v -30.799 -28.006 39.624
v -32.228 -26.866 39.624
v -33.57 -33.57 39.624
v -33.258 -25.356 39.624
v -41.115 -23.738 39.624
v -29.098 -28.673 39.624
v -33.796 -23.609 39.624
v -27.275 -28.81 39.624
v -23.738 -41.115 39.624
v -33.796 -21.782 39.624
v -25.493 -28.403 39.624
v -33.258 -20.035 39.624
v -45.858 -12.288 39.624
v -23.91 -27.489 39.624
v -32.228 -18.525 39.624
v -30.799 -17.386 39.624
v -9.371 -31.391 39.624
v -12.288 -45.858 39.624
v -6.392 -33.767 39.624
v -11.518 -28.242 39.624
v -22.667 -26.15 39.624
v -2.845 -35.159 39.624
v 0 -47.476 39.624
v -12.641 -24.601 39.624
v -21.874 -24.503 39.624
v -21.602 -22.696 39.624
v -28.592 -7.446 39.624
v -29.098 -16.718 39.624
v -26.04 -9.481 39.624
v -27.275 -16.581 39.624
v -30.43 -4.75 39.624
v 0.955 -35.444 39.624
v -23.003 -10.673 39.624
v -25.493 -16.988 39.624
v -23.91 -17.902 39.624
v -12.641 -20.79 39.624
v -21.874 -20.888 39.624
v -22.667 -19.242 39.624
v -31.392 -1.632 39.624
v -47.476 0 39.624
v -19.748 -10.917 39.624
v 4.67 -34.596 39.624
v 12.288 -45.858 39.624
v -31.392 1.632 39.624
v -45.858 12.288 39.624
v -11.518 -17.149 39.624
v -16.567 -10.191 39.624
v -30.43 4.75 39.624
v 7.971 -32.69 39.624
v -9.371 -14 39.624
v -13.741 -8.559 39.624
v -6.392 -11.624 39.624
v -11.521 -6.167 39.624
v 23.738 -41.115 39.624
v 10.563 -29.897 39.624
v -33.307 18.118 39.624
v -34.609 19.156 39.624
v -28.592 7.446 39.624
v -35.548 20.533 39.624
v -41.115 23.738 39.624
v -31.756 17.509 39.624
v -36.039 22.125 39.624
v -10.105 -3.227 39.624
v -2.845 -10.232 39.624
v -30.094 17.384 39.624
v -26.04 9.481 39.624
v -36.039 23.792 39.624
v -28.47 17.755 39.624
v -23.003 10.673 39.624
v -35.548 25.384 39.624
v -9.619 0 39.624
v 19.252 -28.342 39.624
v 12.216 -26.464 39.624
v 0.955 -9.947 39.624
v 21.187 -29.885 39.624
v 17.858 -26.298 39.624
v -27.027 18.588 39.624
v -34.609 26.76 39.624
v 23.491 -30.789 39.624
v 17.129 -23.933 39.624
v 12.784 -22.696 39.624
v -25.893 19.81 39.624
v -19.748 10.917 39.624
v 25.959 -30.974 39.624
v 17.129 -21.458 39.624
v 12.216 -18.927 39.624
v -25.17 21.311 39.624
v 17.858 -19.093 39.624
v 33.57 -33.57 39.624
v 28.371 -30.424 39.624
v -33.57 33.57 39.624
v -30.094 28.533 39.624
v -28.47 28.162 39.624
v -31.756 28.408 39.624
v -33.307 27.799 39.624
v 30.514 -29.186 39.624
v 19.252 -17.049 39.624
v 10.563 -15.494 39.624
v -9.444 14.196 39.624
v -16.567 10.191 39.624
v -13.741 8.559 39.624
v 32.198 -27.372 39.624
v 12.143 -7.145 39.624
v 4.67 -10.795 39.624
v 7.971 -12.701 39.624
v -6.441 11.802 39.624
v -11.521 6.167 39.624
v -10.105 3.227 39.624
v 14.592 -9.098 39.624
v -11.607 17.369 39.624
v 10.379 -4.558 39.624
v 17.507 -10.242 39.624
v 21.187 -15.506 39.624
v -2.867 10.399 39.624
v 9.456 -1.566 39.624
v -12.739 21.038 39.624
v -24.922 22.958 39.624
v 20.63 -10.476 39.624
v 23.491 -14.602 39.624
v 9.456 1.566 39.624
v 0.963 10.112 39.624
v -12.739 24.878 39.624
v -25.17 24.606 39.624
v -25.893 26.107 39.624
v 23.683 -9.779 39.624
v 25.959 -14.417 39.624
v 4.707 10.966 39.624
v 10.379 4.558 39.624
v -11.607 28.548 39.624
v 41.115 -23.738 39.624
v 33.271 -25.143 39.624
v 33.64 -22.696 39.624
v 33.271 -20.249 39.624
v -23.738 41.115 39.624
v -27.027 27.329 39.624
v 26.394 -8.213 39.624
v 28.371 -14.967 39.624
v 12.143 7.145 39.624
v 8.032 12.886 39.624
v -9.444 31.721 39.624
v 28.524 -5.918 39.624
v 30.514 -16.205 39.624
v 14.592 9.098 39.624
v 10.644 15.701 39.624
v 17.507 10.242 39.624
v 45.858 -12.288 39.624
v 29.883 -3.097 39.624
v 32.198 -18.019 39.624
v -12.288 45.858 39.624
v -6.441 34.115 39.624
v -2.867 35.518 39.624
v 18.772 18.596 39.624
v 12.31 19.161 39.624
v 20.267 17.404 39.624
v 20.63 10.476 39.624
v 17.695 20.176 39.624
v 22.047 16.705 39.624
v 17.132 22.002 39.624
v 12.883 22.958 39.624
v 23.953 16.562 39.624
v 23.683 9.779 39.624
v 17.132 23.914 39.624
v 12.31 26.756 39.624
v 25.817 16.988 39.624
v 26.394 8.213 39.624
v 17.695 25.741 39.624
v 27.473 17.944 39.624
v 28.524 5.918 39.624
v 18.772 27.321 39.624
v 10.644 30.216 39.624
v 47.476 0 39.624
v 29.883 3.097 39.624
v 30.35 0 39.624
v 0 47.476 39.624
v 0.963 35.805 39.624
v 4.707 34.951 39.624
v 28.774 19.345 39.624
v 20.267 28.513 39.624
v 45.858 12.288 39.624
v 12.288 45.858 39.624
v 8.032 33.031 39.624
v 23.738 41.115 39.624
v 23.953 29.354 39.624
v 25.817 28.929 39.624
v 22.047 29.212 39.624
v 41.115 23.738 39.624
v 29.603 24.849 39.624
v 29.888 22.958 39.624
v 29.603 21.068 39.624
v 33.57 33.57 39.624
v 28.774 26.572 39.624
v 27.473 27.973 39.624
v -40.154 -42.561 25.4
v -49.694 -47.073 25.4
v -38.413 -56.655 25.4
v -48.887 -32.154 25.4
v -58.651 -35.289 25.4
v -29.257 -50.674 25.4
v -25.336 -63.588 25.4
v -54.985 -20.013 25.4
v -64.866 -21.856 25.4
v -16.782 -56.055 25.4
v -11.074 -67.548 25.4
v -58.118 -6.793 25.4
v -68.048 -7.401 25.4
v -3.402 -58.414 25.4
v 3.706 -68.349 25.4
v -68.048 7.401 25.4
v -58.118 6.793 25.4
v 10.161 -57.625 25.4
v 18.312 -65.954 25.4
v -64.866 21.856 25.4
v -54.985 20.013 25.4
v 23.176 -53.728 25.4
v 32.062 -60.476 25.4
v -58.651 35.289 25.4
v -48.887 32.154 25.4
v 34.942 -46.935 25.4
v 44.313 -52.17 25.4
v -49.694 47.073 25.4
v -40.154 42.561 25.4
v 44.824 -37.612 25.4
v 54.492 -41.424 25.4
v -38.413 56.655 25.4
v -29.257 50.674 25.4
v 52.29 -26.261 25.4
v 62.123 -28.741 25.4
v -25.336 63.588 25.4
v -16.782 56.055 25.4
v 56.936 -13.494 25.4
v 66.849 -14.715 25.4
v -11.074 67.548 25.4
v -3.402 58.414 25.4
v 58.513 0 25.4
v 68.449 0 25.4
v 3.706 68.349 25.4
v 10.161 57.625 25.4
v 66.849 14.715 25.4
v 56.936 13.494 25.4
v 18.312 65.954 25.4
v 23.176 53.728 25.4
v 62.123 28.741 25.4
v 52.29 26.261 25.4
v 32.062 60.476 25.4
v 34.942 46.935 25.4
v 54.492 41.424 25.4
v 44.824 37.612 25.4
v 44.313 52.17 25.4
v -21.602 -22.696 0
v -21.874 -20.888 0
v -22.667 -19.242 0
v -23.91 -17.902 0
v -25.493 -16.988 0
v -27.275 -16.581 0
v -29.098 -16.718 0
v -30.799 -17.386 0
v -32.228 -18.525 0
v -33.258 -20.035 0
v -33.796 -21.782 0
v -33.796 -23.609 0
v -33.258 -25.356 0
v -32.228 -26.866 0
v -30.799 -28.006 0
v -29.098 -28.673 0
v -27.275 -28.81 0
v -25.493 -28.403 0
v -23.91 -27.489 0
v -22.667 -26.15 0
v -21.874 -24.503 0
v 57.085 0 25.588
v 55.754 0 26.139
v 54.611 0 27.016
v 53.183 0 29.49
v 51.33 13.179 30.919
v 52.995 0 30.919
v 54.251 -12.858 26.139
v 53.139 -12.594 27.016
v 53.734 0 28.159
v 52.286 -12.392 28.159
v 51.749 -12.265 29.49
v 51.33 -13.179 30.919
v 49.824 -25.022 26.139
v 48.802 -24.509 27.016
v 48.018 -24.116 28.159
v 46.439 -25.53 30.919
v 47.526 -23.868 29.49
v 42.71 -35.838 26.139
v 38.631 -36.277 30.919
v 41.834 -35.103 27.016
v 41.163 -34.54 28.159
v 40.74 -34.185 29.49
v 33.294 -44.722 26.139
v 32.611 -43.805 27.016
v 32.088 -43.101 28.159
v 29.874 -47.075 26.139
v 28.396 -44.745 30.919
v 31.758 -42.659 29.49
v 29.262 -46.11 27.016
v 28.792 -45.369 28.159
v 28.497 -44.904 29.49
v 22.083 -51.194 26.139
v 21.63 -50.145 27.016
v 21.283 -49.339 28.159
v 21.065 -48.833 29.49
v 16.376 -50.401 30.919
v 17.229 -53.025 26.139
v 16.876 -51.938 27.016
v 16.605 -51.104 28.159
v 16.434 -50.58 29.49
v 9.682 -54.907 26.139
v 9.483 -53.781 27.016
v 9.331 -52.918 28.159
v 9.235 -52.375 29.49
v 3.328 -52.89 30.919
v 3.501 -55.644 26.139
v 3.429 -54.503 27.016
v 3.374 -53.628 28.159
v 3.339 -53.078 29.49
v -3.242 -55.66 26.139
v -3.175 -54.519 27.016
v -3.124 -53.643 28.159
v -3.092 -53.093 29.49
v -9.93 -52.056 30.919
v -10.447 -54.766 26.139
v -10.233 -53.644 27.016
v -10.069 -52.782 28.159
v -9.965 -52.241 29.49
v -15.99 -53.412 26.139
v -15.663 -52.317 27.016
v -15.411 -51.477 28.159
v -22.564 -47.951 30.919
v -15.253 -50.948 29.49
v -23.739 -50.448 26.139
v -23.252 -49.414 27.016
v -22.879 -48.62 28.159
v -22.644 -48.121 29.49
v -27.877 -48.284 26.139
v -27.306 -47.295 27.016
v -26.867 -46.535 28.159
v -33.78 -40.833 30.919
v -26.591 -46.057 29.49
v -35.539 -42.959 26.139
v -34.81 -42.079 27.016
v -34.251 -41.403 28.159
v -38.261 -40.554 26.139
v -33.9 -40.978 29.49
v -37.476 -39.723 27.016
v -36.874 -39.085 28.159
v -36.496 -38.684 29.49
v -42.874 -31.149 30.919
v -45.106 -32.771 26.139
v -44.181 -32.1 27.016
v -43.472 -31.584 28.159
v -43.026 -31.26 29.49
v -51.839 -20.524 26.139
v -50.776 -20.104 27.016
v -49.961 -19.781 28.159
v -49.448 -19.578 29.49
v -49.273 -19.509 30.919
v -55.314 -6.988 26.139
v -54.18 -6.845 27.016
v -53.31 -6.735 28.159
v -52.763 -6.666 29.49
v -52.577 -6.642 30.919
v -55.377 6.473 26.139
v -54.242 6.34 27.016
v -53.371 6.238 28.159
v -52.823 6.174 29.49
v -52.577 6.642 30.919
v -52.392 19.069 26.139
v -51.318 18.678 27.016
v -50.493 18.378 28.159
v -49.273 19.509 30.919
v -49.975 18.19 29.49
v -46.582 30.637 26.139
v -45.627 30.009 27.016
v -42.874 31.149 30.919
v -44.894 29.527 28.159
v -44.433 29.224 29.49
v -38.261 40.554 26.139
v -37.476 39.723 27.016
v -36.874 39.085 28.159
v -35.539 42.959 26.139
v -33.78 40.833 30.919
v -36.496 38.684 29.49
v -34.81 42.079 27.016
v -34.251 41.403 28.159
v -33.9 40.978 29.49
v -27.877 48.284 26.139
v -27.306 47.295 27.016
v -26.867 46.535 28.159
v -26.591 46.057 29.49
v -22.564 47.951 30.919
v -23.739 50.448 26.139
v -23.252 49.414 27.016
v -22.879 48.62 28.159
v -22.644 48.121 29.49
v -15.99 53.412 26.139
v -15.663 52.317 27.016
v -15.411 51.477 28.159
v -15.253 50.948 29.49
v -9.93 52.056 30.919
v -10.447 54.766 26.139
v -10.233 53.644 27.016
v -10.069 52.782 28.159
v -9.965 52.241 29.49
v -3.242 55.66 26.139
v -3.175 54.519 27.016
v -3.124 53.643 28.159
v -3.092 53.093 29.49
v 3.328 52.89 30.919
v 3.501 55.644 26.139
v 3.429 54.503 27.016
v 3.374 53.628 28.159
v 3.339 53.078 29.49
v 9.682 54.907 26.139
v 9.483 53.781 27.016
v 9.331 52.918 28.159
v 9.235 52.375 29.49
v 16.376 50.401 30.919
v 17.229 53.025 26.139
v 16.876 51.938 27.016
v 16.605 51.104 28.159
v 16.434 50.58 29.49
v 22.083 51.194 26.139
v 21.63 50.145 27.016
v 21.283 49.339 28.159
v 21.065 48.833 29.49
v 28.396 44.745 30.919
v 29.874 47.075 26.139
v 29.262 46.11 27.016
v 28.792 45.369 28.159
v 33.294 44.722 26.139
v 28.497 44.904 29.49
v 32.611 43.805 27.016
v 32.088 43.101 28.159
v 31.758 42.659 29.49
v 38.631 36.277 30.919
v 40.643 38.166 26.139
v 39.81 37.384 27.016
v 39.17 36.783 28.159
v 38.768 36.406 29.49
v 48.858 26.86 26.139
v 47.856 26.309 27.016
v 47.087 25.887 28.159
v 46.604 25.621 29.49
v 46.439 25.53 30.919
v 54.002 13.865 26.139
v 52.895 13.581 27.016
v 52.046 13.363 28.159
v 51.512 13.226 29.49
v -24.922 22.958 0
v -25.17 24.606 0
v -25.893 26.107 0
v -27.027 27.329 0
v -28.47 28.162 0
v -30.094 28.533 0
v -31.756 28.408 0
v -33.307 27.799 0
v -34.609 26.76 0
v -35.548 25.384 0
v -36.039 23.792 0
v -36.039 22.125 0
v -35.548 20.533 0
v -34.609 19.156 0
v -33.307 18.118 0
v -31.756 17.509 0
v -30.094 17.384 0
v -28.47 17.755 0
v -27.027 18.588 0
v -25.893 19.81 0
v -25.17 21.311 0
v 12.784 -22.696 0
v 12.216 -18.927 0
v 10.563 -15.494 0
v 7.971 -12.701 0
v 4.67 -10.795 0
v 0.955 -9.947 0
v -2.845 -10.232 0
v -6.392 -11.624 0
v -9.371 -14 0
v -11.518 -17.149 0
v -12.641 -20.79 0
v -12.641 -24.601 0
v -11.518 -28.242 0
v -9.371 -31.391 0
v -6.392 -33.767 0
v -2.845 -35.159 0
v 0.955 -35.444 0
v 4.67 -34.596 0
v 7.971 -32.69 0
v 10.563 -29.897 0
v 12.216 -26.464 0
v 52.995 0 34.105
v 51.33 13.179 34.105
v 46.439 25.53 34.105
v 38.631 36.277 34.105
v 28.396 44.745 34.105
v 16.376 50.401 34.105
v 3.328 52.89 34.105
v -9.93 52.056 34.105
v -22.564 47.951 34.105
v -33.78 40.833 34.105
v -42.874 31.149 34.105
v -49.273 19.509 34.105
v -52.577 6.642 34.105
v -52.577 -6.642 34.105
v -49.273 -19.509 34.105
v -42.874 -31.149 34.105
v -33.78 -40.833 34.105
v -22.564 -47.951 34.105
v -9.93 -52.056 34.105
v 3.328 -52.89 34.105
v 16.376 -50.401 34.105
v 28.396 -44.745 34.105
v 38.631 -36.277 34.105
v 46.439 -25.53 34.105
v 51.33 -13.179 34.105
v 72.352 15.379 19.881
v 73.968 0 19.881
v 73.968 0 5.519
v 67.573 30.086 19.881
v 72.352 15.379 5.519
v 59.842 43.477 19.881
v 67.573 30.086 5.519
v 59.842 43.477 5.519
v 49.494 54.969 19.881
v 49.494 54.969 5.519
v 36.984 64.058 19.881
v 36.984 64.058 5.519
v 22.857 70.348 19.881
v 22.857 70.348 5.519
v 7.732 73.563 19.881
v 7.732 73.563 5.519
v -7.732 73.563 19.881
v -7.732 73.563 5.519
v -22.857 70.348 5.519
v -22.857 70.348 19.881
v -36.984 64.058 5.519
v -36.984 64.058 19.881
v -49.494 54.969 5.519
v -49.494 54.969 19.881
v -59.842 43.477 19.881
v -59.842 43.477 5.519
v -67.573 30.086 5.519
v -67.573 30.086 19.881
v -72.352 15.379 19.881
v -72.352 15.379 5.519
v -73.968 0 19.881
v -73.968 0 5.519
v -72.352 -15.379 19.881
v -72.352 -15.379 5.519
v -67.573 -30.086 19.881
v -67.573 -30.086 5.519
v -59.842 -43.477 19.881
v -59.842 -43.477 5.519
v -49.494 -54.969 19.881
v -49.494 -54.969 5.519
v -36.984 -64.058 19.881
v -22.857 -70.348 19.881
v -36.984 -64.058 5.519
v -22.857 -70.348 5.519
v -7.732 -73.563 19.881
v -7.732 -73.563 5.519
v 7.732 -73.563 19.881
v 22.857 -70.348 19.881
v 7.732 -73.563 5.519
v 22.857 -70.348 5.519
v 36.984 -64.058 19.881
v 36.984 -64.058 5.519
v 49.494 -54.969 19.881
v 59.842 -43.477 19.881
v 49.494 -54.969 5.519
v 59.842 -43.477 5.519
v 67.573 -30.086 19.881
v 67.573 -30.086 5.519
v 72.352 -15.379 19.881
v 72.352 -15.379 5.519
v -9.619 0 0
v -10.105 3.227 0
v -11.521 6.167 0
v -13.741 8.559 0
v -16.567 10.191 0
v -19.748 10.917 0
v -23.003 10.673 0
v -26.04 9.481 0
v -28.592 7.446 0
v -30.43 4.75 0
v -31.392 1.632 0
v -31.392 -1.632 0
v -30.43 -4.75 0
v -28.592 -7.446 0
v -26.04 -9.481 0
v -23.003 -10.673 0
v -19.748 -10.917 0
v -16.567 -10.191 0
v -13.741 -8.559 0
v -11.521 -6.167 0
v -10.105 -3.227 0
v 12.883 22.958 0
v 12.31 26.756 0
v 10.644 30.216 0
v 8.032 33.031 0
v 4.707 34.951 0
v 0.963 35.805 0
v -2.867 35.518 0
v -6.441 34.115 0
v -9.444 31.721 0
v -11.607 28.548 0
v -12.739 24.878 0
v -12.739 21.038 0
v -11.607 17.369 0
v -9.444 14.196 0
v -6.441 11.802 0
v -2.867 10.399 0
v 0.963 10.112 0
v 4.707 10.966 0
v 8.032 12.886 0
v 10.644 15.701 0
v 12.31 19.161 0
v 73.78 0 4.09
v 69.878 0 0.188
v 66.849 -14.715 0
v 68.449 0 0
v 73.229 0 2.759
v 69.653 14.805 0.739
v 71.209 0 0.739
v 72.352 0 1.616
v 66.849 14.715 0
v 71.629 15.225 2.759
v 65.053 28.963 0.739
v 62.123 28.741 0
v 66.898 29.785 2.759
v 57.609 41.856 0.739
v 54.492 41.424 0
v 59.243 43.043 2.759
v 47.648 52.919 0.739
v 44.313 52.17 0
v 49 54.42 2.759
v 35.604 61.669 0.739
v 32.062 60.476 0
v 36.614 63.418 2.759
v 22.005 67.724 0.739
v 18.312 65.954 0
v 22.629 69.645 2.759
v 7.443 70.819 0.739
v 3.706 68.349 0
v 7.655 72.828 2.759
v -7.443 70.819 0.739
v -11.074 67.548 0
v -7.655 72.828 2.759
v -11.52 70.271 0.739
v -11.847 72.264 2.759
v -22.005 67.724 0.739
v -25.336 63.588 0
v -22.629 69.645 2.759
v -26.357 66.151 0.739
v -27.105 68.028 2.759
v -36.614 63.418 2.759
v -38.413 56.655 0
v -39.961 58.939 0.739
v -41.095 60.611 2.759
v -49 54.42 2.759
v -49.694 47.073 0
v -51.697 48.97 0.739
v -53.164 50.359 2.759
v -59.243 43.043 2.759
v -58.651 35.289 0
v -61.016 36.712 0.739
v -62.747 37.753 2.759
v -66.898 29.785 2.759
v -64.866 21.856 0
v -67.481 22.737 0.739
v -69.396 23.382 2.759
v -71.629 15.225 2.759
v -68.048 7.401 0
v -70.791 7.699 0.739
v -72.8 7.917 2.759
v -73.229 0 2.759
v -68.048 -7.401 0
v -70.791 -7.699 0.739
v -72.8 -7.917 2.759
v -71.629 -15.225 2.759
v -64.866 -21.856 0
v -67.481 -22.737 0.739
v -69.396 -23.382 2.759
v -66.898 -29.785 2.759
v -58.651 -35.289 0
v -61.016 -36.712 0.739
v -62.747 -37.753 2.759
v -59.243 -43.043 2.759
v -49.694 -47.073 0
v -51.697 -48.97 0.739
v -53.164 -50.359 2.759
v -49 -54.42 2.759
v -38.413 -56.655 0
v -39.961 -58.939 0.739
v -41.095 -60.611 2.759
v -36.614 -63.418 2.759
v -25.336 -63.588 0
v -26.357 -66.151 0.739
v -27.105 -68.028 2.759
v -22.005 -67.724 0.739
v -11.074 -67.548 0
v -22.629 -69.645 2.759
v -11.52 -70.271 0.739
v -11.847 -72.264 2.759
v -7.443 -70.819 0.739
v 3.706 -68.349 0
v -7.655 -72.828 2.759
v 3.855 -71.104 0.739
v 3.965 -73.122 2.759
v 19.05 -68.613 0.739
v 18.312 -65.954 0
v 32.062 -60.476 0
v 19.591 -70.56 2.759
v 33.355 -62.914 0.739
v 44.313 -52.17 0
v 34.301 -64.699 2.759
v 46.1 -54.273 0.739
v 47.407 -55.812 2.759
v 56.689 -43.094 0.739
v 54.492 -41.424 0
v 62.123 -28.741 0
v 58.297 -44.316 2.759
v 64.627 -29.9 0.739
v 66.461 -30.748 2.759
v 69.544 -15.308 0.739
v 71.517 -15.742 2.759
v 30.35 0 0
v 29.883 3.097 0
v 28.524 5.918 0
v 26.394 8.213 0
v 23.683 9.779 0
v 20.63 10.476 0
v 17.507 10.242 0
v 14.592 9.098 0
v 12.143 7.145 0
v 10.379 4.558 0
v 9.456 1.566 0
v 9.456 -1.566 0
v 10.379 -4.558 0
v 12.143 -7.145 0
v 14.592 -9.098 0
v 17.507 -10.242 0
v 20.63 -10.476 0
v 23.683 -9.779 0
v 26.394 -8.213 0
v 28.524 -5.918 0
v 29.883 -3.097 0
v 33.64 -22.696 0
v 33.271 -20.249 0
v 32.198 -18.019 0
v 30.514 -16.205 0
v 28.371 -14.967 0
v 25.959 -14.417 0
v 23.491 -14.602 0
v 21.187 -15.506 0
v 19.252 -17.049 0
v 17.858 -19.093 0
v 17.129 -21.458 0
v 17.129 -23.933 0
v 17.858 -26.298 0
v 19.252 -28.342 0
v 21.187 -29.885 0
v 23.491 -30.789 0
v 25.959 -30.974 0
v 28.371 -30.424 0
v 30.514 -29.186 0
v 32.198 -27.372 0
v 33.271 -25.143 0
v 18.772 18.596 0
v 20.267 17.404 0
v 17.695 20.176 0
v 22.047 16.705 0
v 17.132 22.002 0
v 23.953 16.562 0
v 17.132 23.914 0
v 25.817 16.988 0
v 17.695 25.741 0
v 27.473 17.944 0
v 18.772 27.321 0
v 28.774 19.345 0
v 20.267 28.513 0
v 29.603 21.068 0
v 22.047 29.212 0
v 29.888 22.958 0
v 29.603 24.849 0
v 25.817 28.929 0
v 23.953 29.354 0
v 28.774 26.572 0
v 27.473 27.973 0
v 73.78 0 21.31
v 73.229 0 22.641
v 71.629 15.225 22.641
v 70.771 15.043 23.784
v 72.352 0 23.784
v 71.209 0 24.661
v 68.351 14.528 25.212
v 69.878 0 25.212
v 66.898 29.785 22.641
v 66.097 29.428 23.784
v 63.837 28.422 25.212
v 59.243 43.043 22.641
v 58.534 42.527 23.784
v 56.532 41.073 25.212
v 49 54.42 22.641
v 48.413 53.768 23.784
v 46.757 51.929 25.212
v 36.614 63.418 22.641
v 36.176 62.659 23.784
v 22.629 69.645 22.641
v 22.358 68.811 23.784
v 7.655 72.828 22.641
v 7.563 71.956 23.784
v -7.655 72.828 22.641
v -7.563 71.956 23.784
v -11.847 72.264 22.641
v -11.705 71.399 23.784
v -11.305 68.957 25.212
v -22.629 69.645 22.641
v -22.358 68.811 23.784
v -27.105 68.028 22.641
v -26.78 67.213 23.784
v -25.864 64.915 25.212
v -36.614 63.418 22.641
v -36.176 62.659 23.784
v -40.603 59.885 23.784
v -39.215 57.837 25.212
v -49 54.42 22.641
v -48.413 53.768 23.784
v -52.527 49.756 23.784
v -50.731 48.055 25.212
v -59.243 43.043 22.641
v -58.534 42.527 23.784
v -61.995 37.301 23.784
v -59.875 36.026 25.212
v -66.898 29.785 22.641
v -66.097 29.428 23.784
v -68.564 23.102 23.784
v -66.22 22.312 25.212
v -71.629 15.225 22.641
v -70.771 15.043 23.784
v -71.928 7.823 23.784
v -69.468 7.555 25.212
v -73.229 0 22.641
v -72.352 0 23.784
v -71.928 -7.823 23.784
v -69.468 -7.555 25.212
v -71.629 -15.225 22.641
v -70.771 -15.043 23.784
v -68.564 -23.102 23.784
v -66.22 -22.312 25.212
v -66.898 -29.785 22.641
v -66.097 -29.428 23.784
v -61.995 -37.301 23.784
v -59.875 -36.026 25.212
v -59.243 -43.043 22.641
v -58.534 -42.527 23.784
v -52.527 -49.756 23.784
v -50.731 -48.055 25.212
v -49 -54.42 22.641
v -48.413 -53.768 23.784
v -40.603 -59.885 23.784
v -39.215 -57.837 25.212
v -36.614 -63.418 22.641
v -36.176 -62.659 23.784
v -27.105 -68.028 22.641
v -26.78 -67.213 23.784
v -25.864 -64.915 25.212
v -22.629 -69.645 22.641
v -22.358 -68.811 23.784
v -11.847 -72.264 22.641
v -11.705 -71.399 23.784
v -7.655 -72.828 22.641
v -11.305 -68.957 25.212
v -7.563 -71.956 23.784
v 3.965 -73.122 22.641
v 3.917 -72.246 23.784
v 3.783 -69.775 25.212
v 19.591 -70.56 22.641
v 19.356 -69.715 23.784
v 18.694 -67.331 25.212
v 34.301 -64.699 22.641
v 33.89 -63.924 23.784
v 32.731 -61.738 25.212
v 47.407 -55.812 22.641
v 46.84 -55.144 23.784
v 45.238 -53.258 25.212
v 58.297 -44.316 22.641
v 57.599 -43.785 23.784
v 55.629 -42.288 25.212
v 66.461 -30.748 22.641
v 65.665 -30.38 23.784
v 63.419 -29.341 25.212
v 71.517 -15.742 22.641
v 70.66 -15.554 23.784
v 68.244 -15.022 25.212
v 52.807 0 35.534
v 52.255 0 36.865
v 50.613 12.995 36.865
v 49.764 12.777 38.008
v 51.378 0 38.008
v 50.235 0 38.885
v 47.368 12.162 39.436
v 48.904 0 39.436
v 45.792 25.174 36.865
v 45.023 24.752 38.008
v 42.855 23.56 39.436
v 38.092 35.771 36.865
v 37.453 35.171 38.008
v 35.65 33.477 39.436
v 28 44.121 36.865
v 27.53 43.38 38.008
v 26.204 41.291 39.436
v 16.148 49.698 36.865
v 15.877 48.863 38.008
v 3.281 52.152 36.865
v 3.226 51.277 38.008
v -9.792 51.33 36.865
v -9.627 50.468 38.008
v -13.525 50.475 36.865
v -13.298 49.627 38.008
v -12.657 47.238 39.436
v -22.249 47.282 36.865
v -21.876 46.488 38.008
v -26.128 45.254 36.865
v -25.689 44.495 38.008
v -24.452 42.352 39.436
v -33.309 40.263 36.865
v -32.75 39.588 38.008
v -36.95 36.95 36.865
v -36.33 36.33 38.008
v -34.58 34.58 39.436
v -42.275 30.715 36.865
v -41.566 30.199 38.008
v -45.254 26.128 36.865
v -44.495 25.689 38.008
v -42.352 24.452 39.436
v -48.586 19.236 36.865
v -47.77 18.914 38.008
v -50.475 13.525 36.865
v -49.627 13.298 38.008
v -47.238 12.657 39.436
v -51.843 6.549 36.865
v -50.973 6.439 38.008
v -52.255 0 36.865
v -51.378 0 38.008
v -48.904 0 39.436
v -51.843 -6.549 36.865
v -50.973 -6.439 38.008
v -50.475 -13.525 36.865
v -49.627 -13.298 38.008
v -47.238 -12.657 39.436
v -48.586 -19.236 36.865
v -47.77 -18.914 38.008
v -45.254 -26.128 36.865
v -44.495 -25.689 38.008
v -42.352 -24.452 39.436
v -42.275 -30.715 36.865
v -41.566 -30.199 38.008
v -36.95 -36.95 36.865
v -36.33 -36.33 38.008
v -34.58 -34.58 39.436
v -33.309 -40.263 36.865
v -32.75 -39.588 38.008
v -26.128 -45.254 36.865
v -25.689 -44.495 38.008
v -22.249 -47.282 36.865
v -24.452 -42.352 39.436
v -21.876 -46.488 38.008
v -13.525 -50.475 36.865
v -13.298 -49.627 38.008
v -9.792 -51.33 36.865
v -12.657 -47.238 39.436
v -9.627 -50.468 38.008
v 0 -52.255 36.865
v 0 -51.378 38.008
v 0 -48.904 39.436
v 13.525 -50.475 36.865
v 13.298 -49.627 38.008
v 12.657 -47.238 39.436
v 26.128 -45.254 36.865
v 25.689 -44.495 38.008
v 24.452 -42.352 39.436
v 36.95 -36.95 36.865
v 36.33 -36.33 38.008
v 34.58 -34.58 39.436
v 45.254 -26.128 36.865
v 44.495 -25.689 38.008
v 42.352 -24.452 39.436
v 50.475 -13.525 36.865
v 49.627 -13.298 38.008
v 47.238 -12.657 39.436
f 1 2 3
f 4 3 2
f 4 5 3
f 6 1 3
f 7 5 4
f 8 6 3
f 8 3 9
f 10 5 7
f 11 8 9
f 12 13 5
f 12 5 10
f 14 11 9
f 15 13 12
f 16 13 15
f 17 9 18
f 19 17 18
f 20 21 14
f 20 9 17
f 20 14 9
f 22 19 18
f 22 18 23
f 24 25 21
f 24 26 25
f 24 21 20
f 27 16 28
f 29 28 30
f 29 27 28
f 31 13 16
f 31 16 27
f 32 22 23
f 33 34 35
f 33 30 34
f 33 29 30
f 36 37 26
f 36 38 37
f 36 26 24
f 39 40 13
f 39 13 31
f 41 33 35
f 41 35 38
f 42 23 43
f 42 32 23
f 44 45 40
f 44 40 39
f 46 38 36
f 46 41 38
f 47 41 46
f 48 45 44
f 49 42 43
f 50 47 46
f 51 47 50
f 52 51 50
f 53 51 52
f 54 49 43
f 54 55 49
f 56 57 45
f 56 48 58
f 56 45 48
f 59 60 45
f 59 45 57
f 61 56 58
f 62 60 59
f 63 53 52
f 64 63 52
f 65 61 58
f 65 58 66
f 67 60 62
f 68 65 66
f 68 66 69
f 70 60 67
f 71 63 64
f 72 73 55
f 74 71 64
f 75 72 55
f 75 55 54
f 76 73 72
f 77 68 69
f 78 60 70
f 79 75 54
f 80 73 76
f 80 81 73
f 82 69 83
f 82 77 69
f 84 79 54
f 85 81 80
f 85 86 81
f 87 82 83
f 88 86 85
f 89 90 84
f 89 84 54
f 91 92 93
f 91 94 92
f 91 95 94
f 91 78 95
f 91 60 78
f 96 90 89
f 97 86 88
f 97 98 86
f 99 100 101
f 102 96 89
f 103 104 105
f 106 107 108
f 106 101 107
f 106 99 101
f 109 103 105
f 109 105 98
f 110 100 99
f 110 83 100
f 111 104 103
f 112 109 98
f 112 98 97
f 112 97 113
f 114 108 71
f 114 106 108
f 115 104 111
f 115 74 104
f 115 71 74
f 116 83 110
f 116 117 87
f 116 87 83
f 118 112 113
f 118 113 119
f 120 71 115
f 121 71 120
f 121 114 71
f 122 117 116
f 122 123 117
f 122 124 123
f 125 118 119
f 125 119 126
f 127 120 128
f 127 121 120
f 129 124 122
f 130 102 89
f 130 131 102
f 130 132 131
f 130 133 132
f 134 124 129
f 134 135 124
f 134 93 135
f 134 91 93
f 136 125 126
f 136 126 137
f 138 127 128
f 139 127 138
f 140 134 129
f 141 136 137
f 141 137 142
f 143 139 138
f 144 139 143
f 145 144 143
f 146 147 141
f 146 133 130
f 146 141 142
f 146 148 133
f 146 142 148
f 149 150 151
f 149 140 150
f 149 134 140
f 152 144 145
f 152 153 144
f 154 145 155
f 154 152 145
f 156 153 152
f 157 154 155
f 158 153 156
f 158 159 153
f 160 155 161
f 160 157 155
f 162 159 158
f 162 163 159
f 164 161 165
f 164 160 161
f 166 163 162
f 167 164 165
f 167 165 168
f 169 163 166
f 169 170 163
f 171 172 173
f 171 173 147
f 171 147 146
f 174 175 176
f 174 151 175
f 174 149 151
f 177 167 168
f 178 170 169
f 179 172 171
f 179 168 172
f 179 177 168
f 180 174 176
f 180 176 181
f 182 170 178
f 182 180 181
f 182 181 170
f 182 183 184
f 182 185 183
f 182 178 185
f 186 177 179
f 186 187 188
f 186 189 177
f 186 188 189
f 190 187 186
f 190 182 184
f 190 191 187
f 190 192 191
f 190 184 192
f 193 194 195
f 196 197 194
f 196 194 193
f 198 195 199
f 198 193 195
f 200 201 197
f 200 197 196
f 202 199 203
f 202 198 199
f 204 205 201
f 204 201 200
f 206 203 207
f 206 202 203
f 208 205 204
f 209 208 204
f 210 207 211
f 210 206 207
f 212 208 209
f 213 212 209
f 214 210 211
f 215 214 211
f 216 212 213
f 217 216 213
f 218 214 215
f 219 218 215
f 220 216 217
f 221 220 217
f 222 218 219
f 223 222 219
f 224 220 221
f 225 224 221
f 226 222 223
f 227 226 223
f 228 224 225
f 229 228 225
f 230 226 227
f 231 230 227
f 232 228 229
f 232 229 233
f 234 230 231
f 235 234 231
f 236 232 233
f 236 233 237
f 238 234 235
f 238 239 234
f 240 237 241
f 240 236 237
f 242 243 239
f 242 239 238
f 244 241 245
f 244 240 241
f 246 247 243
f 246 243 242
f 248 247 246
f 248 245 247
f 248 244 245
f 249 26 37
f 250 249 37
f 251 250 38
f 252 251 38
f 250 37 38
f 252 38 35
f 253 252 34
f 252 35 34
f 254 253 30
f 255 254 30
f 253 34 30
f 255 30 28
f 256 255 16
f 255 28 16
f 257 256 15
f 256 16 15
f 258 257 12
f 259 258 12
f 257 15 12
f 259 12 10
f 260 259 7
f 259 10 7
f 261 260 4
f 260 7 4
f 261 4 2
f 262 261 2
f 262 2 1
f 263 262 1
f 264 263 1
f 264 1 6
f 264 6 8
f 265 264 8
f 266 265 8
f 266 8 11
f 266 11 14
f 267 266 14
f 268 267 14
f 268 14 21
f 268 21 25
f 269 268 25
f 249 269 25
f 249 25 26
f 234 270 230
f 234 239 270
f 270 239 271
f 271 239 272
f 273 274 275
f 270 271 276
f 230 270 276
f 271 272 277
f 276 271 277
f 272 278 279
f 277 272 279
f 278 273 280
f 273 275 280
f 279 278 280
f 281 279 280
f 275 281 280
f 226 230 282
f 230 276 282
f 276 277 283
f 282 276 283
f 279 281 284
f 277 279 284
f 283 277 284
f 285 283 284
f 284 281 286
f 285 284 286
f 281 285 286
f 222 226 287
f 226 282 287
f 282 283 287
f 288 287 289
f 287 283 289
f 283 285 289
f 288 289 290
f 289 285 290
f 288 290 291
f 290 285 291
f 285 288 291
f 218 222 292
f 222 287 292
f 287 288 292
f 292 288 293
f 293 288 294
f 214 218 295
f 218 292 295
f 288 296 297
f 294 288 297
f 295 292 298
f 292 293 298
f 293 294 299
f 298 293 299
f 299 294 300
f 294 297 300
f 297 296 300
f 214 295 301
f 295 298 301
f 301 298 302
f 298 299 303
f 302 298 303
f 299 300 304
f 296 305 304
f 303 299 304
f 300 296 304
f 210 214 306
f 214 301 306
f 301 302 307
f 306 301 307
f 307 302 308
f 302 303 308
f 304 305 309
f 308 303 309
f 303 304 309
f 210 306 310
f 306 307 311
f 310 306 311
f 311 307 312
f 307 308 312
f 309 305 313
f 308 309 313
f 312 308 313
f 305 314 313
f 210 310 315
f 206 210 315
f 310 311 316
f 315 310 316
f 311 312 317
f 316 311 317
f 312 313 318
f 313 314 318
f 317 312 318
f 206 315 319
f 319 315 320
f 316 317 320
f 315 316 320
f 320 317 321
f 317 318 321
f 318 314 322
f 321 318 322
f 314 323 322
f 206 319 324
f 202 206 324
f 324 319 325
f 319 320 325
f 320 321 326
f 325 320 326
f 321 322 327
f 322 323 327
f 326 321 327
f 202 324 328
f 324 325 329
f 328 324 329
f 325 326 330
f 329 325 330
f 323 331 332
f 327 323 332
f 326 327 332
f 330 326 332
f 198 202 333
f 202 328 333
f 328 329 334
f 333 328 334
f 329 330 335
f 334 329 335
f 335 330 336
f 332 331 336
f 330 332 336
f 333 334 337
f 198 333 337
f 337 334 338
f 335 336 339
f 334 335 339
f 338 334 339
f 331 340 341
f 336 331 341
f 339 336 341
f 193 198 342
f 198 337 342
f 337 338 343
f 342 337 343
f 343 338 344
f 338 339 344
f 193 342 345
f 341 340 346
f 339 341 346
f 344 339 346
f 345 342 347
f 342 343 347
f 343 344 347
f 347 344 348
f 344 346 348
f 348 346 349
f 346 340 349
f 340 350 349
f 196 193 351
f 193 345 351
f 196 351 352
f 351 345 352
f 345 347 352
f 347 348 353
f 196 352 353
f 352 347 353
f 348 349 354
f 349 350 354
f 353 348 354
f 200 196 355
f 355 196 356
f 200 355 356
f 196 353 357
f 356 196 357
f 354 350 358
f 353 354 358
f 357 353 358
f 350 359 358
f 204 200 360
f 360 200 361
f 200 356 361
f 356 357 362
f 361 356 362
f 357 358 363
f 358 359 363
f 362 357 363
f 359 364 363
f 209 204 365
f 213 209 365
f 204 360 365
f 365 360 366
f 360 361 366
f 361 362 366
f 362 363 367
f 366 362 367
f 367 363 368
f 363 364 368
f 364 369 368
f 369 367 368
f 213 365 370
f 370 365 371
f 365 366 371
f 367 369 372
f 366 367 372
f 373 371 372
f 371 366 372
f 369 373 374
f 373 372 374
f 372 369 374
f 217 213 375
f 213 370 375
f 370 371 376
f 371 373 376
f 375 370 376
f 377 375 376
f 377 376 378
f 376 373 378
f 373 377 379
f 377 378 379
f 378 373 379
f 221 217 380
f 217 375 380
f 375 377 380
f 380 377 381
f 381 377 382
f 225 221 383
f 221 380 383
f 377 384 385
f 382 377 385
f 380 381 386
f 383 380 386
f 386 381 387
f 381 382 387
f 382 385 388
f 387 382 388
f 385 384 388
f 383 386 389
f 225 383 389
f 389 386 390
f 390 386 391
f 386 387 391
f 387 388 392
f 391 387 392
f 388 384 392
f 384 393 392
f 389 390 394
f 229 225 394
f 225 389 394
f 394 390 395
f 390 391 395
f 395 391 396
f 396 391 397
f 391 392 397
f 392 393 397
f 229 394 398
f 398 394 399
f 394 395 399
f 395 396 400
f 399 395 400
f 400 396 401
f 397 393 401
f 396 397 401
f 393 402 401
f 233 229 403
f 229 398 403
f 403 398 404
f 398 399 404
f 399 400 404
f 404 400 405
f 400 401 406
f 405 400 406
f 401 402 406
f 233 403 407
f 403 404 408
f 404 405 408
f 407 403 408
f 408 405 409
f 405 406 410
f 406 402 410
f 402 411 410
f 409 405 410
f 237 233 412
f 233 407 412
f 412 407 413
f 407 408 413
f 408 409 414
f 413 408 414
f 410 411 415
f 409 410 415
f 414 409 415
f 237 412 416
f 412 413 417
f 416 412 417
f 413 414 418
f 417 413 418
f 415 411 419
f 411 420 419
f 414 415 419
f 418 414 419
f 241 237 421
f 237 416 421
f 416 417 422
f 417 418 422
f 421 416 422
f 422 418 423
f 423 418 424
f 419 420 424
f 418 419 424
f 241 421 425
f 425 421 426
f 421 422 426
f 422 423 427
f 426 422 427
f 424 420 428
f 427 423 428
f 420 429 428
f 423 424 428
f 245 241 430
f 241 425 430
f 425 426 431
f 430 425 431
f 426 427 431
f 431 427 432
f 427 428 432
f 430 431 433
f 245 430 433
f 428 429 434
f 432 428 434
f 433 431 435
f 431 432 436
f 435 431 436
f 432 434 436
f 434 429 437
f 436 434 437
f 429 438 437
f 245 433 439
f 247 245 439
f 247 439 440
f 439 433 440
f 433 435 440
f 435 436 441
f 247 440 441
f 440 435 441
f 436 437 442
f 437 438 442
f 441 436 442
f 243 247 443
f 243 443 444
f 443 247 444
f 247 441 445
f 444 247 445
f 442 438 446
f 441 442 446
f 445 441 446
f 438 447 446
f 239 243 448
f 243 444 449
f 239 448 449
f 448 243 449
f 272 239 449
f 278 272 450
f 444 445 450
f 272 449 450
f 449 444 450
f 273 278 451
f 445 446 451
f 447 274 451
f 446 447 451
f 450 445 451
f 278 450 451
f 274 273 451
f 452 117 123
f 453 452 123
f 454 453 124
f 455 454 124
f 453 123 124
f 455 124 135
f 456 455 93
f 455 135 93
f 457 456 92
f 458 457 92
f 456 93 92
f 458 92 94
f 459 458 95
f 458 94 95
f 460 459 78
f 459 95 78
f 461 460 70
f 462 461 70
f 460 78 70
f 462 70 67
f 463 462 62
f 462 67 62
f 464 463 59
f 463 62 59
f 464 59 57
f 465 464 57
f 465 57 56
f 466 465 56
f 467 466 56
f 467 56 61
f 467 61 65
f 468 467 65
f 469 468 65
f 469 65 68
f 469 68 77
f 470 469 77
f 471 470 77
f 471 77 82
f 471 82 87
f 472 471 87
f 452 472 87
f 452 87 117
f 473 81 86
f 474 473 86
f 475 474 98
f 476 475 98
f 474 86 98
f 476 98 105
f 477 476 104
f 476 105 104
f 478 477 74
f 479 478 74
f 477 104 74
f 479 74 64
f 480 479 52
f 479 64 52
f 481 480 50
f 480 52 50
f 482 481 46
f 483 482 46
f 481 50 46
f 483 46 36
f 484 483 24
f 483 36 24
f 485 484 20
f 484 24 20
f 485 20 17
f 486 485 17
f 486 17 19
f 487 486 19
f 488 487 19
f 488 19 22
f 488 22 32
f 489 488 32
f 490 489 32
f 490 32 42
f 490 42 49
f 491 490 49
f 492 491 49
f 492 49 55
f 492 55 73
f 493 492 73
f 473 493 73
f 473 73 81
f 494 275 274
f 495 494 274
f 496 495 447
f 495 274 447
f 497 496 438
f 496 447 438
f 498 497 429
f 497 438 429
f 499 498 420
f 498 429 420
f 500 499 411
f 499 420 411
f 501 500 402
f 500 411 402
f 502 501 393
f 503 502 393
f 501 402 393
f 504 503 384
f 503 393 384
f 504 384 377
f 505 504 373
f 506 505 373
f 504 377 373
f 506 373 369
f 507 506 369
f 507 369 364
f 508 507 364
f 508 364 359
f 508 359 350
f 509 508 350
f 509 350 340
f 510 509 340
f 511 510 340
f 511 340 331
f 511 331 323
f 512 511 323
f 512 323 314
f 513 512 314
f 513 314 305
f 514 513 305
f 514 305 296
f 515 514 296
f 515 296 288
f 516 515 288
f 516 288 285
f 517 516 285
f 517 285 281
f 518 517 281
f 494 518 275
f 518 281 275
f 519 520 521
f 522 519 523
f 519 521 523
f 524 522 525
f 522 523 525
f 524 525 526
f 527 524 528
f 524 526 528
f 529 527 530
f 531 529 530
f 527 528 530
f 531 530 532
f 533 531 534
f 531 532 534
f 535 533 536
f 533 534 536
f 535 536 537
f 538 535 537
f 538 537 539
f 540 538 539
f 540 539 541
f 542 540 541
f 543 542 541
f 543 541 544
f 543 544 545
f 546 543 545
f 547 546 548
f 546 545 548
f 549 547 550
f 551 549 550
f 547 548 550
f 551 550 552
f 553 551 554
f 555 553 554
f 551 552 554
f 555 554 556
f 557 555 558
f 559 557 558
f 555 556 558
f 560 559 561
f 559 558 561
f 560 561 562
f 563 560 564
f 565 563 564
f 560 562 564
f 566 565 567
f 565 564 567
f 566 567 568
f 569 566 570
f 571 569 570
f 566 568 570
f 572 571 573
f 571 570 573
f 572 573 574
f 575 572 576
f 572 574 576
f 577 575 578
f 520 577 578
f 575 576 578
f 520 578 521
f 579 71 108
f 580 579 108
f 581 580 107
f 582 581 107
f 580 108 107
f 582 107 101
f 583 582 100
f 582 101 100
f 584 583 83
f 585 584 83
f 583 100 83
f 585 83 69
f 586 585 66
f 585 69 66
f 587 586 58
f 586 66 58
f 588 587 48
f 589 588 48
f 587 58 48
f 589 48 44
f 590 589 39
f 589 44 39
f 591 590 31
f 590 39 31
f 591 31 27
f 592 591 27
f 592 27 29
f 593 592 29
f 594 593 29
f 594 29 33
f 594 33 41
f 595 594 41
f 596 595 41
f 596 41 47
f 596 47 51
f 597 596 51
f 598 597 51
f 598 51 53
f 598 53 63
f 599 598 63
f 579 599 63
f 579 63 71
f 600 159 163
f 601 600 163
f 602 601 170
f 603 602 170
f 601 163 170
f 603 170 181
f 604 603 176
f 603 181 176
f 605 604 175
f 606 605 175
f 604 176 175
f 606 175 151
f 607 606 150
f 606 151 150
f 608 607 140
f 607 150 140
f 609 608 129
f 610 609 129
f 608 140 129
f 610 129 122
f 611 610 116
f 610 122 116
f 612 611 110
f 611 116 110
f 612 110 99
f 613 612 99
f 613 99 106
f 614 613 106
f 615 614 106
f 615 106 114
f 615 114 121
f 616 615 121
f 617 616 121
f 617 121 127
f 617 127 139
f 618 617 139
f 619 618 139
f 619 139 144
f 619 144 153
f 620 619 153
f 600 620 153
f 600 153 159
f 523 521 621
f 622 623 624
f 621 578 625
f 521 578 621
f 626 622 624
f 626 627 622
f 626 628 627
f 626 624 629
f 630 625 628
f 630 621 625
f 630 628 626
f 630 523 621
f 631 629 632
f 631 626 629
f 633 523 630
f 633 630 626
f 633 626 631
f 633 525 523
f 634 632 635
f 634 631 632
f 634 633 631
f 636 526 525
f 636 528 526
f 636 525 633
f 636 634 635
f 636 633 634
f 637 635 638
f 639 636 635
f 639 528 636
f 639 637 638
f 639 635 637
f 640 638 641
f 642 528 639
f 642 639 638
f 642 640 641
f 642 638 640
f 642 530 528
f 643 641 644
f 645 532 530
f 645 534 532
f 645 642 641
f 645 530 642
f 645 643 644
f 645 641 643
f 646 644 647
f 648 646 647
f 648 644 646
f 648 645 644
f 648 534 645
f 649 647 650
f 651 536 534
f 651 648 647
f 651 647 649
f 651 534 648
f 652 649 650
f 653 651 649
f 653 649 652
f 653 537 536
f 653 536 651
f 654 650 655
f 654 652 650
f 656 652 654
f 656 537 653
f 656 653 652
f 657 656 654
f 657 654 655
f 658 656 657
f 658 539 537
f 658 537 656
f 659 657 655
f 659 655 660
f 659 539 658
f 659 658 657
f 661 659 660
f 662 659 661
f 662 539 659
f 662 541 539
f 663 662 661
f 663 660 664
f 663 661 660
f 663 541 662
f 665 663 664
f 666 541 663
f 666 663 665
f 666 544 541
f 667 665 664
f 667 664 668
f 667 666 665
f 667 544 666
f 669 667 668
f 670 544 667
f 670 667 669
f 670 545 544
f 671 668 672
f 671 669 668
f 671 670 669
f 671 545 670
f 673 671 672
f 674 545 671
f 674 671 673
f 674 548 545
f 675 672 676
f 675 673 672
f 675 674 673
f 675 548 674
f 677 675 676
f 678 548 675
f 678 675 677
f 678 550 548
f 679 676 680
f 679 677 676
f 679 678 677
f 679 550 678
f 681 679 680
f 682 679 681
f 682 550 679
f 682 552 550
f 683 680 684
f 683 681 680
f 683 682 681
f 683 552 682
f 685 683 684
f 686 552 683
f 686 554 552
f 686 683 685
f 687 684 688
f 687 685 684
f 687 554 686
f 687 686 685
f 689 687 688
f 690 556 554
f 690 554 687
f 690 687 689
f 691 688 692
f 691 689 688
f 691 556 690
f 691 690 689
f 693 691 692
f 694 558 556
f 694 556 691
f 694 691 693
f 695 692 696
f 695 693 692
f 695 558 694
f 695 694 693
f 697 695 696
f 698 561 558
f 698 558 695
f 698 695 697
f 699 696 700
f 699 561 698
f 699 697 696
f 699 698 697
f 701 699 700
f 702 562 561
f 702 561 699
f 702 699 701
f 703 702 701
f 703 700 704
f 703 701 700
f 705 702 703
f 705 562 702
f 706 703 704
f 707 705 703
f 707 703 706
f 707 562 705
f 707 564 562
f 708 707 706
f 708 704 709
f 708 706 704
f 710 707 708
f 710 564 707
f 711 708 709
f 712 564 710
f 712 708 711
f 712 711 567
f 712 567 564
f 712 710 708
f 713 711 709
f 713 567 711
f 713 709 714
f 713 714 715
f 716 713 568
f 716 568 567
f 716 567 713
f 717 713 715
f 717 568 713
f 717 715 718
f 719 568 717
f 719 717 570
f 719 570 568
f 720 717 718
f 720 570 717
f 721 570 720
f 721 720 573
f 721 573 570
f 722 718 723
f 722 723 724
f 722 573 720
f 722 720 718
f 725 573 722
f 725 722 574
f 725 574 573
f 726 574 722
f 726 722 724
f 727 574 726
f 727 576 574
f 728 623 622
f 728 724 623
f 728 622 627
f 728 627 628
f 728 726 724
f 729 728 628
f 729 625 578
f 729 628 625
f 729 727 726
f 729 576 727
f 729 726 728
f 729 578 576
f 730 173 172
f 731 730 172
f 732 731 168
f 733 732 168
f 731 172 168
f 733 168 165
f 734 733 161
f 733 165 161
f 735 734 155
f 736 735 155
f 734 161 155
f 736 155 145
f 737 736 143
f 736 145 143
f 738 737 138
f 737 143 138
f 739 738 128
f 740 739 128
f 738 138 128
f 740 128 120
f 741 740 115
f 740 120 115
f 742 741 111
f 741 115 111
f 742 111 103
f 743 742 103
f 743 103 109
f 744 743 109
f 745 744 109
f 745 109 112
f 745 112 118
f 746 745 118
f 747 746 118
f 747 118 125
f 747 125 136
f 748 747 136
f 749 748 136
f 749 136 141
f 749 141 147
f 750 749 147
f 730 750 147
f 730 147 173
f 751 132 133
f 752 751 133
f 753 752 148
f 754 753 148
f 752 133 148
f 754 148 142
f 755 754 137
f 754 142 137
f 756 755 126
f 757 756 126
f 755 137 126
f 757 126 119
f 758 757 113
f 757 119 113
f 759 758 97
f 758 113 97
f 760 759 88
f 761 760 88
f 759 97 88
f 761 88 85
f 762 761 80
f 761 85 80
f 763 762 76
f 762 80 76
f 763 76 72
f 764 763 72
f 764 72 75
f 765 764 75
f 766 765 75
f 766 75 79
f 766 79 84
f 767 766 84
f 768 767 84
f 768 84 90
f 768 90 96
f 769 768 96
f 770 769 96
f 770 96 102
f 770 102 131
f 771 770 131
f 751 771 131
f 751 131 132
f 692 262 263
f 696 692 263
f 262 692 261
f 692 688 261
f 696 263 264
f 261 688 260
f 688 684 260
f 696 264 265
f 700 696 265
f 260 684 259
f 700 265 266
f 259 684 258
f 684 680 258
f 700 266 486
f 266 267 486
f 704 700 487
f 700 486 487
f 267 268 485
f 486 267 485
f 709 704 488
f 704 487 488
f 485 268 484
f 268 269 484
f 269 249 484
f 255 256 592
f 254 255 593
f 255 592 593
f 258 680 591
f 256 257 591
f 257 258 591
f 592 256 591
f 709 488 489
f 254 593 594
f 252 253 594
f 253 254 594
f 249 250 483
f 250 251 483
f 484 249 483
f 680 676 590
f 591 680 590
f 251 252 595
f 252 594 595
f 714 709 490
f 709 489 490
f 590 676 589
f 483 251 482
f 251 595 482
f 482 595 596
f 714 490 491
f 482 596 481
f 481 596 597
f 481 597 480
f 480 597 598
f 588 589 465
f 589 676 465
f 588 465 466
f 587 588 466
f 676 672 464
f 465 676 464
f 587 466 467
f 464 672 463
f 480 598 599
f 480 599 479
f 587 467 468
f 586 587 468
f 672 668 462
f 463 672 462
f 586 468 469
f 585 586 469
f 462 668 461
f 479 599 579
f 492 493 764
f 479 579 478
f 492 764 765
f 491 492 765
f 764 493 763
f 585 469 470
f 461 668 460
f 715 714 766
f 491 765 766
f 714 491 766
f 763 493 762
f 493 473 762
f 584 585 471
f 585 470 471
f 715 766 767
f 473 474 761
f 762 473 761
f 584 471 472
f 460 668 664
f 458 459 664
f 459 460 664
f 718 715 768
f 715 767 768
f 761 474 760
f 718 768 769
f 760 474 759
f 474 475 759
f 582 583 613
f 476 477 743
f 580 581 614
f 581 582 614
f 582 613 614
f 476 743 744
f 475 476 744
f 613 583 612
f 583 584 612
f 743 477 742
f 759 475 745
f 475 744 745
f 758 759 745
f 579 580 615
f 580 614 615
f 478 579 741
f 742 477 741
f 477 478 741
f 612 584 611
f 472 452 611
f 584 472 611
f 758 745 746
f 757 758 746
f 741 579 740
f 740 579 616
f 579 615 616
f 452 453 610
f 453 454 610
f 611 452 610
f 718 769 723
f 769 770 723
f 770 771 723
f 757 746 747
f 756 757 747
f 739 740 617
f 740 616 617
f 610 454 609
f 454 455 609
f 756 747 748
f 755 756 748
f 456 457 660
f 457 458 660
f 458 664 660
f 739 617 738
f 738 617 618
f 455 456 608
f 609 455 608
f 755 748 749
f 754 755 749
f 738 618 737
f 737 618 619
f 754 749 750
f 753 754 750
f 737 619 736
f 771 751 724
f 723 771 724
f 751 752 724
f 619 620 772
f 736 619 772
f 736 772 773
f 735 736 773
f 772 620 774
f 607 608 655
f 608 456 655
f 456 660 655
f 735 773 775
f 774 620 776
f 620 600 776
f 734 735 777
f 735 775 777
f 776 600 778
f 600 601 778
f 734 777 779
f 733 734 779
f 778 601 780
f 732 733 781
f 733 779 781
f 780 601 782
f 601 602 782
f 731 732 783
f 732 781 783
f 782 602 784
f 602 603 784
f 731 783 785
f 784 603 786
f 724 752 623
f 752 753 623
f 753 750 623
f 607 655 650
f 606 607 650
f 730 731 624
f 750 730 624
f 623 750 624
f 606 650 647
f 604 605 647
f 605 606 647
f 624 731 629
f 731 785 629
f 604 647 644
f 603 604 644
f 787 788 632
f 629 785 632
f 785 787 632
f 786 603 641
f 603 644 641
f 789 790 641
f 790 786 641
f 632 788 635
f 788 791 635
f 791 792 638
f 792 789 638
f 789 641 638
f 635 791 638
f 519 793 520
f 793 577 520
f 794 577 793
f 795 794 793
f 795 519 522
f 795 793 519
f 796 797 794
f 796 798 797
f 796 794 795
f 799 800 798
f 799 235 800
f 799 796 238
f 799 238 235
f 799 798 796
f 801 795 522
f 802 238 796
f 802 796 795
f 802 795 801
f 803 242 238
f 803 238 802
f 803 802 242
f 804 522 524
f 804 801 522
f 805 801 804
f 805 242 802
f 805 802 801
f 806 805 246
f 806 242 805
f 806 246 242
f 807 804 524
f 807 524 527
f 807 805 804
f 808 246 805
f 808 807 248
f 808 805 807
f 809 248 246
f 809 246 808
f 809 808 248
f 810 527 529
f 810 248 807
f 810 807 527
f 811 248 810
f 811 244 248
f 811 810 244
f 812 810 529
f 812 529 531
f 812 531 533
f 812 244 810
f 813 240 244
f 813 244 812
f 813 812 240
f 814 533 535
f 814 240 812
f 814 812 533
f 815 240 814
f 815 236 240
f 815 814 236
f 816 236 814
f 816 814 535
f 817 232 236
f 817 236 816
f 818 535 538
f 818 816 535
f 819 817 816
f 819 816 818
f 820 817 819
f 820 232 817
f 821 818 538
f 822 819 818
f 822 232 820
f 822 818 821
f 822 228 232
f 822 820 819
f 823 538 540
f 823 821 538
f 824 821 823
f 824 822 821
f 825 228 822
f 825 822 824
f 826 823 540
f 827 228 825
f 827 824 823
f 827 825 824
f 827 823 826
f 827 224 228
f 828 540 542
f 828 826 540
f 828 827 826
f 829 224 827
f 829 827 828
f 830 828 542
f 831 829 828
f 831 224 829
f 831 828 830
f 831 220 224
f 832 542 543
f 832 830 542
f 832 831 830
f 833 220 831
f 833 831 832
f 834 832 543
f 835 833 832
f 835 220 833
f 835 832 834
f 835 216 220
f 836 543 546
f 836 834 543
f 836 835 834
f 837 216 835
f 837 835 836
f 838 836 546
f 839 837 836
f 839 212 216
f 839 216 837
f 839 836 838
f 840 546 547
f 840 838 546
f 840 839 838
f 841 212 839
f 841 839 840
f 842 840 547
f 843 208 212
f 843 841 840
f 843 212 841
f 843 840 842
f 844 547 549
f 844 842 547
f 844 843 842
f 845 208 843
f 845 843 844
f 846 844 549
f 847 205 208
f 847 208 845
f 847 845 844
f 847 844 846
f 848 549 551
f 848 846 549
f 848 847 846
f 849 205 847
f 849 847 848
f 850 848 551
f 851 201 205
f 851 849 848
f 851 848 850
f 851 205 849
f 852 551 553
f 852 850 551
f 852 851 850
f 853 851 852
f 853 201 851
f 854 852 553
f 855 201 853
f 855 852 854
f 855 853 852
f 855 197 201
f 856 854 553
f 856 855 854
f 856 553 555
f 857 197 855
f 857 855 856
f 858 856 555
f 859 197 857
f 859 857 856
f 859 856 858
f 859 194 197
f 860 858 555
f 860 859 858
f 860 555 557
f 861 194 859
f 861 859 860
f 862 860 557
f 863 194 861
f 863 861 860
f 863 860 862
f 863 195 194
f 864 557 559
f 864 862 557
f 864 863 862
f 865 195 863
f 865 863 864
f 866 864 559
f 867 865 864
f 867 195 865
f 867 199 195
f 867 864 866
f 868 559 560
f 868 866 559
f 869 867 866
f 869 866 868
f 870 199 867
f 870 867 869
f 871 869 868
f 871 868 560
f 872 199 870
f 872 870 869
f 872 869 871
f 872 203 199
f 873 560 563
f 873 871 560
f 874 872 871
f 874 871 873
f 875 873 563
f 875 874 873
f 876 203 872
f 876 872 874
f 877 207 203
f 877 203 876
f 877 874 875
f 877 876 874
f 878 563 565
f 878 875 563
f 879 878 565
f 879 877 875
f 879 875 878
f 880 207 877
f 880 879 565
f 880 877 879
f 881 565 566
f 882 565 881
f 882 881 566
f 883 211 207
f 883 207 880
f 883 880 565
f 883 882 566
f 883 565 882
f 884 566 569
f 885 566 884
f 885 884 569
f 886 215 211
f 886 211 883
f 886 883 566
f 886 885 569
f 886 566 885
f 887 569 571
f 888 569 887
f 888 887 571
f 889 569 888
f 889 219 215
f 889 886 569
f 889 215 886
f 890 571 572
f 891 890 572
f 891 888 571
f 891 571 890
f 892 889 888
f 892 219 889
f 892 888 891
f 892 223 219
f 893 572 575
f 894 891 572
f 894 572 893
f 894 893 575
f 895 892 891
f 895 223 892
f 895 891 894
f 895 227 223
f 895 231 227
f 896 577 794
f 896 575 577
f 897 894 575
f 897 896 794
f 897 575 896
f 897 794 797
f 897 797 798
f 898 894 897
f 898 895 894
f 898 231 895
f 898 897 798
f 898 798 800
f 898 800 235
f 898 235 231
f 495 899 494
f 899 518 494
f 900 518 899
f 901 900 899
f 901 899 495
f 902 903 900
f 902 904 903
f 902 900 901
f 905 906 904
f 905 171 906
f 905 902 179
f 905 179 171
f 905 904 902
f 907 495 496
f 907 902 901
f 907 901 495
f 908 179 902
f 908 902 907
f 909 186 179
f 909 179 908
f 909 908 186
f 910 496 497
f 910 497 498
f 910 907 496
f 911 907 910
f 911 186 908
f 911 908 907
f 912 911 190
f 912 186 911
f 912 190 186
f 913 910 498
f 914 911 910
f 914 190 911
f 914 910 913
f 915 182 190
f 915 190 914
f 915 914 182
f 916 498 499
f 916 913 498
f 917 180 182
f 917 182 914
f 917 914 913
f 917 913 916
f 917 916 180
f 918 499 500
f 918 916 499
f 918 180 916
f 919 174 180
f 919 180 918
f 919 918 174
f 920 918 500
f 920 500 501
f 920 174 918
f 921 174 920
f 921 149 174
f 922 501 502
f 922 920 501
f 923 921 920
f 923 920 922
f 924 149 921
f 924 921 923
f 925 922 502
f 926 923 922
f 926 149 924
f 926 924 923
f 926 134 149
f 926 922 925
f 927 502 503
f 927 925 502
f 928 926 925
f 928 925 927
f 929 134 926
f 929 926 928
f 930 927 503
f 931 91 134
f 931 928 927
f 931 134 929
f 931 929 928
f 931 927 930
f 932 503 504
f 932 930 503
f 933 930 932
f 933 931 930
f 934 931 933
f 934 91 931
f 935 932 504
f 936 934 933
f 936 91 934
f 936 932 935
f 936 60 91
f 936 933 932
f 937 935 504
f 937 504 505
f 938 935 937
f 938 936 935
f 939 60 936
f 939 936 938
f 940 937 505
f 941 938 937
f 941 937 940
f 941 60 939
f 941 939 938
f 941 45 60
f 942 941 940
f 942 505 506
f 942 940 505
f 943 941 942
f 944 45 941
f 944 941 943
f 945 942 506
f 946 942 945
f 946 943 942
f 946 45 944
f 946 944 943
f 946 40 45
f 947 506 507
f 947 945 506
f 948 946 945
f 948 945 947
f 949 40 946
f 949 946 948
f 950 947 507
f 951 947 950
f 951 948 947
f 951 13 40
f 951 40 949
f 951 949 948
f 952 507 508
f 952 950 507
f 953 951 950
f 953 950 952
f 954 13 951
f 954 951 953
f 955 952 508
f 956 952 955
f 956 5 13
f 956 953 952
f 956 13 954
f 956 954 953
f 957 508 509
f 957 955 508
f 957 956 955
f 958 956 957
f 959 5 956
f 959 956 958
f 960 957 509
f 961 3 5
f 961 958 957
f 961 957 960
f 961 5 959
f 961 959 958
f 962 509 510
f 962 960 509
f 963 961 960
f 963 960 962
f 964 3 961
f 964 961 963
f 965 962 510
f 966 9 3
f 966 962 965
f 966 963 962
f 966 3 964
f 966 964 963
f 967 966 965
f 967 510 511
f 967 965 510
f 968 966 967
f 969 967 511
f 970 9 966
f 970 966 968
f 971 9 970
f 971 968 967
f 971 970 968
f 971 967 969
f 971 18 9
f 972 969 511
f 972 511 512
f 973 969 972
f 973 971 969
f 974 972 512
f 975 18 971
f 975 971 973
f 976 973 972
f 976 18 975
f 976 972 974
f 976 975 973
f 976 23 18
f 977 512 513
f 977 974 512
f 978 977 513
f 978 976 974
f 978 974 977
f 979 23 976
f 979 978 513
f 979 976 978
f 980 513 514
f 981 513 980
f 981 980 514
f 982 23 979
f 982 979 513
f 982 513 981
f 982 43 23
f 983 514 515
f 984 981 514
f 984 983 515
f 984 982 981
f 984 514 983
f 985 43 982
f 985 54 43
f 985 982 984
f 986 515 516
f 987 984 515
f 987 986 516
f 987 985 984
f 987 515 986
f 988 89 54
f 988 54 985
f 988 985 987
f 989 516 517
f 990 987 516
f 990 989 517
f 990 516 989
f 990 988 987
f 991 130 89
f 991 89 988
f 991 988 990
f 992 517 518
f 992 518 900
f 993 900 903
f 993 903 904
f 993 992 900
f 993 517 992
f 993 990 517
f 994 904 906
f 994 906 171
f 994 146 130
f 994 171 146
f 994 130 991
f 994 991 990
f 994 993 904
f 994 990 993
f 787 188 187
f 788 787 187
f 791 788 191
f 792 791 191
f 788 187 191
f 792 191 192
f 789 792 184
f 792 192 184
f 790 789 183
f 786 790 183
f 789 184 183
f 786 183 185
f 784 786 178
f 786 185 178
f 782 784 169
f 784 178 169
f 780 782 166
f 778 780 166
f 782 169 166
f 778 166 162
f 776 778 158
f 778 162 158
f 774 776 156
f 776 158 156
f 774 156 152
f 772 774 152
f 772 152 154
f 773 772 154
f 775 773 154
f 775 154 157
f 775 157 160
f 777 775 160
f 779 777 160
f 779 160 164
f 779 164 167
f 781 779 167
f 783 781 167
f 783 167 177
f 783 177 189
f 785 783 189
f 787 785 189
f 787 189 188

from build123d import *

# Parameters (mm, degrees)
F0_R     = 73.968318151
F2_DEPTH = 25.4
F1_R     = 52.9945680325
F3_DEPTH = 39.624
F5_R     = 5.5188922036
F6_R     = 12.8827349719
F6_R_2   = 12.7839169131
F6_R_3   = 10.9478367458
F6_R_4   = 6.1315337815
F6_R_5   = 5.5897287033
F6_R_6   = 6.4139336727
F6_R_7   = 8.3020391009
F7_DEPTH = 70.866
F8_R     = 10.5053608139
F9_DEPTH = 50.546


with BuildPart() as f2:
    # F0 (on Top) → F2 (new body)
    with BuildSketch(Plane.XY):
        Circle(F0_R)
    extrude(amount=F2_DEPTH)

    # F1 (on face) → F3 (join)
    with BuildSketch(Plane.XY):
        Circle(F1_R)
    extrude(amount=F3_DEPTH)

    # F5
    f5_edges = [f2.edges().sort_by_distance(p)[0] for p in [
        (-52.994568, 0, 25.4),
        (52.994568, 0, 32.512),
        (-52.994568, 0, 39.624),
        (73.968318, 0, 12.7),
        (-73.968318, 0, 0),
        (-73.968318, 0, 25.4),
    ]]
    fillet(f5_edges, radius=F5_R)

    # F6 (on face) → F7 (cut)
    with BuildSketch(Plane.XY.offset(39.624)):
        with Locations((0, 22.9584183544)):
            Circle(F6_R)
        with Locations((0, -22.6955935359)):
            Circle(F6_R_2)
        with Locations((-20.5665808171, 0)):
            Circle(F6_R_3)
        with Locations((-27.7332775295, -22.6955935359)):
            Circle(F6_R_4)
        with Locations((-30.5117629468, 22.9584183544)):
            Circle(F6_R_5)
        with Locations((23.4740655869, 22.9584183544)):
            Circle(F6_R_6)
        with Locations((25.338197127, -22.6955935359)):
            Circle(F6_R_7)
    extrude(amount=-F7_DEPTH, mode=Mode.SUBTRACT)

    # F8 (on face) → F9 (cut)
    with BuildSketch(Plane.XY.offset(39.624)):
        with Locations((19.8444724083, 0)):
            Circle(F8_R)
    extrude(amount=-F9_DEPTH, mode=Mode.SUBTRACT)


solid = f2.part
